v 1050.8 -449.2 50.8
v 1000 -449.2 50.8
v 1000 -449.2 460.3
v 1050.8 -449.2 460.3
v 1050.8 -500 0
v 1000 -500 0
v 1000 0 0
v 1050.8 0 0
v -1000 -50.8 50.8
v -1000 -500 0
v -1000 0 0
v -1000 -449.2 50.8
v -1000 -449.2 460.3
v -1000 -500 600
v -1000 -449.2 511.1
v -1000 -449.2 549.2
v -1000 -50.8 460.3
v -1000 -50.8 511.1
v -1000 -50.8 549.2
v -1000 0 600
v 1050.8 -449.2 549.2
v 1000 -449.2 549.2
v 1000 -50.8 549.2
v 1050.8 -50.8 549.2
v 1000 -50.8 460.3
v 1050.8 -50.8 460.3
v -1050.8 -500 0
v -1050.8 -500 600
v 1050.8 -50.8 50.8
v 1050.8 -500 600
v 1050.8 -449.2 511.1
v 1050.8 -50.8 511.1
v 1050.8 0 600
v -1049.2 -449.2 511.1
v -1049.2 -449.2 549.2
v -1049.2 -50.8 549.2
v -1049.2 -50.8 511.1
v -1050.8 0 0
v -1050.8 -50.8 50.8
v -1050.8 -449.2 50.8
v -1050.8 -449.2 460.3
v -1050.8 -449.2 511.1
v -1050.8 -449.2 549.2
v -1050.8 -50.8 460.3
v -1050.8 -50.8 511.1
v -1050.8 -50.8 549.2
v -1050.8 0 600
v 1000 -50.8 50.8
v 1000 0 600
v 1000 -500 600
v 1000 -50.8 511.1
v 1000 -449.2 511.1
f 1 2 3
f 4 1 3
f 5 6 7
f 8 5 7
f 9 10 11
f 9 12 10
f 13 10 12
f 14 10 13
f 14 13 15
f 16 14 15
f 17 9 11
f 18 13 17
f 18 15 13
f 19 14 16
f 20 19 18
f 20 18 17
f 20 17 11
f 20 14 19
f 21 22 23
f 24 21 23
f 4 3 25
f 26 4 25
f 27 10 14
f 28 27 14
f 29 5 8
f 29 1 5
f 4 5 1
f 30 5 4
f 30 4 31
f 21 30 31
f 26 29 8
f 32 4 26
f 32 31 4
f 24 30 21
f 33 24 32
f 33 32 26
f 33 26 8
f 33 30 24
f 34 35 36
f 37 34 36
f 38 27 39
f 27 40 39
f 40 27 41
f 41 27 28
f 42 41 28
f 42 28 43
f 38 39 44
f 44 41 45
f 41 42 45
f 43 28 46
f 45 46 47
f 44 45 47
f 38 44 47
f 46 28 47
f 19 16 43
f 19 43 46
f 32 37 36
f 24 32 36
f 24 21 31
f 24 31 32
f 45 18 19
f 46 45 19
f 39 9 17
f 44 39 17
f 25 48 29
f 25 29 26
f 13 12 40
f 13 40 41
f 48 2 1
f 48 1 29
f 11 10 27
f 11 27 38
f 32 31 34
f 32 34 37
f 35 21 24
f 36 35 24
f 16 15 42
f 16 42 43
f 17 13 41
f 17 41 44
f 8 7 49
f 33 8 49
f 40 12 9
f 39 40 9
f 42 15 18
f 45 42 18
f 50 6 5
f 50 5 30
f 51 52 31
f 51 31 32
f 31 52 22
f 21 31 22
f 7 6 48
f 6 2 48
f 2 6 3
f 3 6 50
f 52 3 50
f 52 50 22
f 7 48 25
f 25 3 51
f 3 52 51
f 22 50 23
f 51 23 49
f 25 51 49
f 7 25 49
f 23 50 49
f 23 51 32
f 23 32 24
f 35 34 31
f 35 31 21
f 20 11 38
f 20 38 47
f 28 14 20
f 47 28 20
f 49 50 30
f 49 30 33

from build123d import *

# Parameters (mm, degrees)
F1_W     = 500
F1_H     = 600
F1_W_2   = 398.4
F1_H_2   = 498.4
F2_DEPTH = 50.8
F3_W     = 398.4
F3_H     = 50.8
F4_DEPTH = 50.8
F6_W     = 398.4
F6_H     = 38.1
F7_DEPTH = 2100


with BuildPart() as f2:
    # F1 (on offset) → F2 (new body)
    with BuildSketch(Plane.YZ.offset(1000)):
        with Locations((-250, 300)):
            Rectangle(F1_W, F1_H)
        with Locations((-250, 300)):
            Rectangle(F1_W_2, F1_H_2, mode=Mode.SUBTRACT)
    extrude(amount=F2_DEPTH)

    # F3 (on offset) → F4 (join)
    with BuildSketch(Plane.YZ.offset(1000)):
        with Locations((-250, 485.7)):
            Rectangle(F3_W, F3_H)
    extrude(amount=F4_DEPTH)


with BuildPart() as f5_1:
    # F5: instance of F2
    add(f2.part.mirror(Plane.YZ))


with BuildPart() as f7:
    # F6 (on face) → F7 (new body)
    with BuildSketch(Plane.YZ.offset(1050.8)):
        with Locations((-250, 530.15)):
            Rectangle(F6_W, F6_H)
    extrude(amount=-F7_DEPTH)


solid = Compound([f2.part, f5_1.part, f7.part])
